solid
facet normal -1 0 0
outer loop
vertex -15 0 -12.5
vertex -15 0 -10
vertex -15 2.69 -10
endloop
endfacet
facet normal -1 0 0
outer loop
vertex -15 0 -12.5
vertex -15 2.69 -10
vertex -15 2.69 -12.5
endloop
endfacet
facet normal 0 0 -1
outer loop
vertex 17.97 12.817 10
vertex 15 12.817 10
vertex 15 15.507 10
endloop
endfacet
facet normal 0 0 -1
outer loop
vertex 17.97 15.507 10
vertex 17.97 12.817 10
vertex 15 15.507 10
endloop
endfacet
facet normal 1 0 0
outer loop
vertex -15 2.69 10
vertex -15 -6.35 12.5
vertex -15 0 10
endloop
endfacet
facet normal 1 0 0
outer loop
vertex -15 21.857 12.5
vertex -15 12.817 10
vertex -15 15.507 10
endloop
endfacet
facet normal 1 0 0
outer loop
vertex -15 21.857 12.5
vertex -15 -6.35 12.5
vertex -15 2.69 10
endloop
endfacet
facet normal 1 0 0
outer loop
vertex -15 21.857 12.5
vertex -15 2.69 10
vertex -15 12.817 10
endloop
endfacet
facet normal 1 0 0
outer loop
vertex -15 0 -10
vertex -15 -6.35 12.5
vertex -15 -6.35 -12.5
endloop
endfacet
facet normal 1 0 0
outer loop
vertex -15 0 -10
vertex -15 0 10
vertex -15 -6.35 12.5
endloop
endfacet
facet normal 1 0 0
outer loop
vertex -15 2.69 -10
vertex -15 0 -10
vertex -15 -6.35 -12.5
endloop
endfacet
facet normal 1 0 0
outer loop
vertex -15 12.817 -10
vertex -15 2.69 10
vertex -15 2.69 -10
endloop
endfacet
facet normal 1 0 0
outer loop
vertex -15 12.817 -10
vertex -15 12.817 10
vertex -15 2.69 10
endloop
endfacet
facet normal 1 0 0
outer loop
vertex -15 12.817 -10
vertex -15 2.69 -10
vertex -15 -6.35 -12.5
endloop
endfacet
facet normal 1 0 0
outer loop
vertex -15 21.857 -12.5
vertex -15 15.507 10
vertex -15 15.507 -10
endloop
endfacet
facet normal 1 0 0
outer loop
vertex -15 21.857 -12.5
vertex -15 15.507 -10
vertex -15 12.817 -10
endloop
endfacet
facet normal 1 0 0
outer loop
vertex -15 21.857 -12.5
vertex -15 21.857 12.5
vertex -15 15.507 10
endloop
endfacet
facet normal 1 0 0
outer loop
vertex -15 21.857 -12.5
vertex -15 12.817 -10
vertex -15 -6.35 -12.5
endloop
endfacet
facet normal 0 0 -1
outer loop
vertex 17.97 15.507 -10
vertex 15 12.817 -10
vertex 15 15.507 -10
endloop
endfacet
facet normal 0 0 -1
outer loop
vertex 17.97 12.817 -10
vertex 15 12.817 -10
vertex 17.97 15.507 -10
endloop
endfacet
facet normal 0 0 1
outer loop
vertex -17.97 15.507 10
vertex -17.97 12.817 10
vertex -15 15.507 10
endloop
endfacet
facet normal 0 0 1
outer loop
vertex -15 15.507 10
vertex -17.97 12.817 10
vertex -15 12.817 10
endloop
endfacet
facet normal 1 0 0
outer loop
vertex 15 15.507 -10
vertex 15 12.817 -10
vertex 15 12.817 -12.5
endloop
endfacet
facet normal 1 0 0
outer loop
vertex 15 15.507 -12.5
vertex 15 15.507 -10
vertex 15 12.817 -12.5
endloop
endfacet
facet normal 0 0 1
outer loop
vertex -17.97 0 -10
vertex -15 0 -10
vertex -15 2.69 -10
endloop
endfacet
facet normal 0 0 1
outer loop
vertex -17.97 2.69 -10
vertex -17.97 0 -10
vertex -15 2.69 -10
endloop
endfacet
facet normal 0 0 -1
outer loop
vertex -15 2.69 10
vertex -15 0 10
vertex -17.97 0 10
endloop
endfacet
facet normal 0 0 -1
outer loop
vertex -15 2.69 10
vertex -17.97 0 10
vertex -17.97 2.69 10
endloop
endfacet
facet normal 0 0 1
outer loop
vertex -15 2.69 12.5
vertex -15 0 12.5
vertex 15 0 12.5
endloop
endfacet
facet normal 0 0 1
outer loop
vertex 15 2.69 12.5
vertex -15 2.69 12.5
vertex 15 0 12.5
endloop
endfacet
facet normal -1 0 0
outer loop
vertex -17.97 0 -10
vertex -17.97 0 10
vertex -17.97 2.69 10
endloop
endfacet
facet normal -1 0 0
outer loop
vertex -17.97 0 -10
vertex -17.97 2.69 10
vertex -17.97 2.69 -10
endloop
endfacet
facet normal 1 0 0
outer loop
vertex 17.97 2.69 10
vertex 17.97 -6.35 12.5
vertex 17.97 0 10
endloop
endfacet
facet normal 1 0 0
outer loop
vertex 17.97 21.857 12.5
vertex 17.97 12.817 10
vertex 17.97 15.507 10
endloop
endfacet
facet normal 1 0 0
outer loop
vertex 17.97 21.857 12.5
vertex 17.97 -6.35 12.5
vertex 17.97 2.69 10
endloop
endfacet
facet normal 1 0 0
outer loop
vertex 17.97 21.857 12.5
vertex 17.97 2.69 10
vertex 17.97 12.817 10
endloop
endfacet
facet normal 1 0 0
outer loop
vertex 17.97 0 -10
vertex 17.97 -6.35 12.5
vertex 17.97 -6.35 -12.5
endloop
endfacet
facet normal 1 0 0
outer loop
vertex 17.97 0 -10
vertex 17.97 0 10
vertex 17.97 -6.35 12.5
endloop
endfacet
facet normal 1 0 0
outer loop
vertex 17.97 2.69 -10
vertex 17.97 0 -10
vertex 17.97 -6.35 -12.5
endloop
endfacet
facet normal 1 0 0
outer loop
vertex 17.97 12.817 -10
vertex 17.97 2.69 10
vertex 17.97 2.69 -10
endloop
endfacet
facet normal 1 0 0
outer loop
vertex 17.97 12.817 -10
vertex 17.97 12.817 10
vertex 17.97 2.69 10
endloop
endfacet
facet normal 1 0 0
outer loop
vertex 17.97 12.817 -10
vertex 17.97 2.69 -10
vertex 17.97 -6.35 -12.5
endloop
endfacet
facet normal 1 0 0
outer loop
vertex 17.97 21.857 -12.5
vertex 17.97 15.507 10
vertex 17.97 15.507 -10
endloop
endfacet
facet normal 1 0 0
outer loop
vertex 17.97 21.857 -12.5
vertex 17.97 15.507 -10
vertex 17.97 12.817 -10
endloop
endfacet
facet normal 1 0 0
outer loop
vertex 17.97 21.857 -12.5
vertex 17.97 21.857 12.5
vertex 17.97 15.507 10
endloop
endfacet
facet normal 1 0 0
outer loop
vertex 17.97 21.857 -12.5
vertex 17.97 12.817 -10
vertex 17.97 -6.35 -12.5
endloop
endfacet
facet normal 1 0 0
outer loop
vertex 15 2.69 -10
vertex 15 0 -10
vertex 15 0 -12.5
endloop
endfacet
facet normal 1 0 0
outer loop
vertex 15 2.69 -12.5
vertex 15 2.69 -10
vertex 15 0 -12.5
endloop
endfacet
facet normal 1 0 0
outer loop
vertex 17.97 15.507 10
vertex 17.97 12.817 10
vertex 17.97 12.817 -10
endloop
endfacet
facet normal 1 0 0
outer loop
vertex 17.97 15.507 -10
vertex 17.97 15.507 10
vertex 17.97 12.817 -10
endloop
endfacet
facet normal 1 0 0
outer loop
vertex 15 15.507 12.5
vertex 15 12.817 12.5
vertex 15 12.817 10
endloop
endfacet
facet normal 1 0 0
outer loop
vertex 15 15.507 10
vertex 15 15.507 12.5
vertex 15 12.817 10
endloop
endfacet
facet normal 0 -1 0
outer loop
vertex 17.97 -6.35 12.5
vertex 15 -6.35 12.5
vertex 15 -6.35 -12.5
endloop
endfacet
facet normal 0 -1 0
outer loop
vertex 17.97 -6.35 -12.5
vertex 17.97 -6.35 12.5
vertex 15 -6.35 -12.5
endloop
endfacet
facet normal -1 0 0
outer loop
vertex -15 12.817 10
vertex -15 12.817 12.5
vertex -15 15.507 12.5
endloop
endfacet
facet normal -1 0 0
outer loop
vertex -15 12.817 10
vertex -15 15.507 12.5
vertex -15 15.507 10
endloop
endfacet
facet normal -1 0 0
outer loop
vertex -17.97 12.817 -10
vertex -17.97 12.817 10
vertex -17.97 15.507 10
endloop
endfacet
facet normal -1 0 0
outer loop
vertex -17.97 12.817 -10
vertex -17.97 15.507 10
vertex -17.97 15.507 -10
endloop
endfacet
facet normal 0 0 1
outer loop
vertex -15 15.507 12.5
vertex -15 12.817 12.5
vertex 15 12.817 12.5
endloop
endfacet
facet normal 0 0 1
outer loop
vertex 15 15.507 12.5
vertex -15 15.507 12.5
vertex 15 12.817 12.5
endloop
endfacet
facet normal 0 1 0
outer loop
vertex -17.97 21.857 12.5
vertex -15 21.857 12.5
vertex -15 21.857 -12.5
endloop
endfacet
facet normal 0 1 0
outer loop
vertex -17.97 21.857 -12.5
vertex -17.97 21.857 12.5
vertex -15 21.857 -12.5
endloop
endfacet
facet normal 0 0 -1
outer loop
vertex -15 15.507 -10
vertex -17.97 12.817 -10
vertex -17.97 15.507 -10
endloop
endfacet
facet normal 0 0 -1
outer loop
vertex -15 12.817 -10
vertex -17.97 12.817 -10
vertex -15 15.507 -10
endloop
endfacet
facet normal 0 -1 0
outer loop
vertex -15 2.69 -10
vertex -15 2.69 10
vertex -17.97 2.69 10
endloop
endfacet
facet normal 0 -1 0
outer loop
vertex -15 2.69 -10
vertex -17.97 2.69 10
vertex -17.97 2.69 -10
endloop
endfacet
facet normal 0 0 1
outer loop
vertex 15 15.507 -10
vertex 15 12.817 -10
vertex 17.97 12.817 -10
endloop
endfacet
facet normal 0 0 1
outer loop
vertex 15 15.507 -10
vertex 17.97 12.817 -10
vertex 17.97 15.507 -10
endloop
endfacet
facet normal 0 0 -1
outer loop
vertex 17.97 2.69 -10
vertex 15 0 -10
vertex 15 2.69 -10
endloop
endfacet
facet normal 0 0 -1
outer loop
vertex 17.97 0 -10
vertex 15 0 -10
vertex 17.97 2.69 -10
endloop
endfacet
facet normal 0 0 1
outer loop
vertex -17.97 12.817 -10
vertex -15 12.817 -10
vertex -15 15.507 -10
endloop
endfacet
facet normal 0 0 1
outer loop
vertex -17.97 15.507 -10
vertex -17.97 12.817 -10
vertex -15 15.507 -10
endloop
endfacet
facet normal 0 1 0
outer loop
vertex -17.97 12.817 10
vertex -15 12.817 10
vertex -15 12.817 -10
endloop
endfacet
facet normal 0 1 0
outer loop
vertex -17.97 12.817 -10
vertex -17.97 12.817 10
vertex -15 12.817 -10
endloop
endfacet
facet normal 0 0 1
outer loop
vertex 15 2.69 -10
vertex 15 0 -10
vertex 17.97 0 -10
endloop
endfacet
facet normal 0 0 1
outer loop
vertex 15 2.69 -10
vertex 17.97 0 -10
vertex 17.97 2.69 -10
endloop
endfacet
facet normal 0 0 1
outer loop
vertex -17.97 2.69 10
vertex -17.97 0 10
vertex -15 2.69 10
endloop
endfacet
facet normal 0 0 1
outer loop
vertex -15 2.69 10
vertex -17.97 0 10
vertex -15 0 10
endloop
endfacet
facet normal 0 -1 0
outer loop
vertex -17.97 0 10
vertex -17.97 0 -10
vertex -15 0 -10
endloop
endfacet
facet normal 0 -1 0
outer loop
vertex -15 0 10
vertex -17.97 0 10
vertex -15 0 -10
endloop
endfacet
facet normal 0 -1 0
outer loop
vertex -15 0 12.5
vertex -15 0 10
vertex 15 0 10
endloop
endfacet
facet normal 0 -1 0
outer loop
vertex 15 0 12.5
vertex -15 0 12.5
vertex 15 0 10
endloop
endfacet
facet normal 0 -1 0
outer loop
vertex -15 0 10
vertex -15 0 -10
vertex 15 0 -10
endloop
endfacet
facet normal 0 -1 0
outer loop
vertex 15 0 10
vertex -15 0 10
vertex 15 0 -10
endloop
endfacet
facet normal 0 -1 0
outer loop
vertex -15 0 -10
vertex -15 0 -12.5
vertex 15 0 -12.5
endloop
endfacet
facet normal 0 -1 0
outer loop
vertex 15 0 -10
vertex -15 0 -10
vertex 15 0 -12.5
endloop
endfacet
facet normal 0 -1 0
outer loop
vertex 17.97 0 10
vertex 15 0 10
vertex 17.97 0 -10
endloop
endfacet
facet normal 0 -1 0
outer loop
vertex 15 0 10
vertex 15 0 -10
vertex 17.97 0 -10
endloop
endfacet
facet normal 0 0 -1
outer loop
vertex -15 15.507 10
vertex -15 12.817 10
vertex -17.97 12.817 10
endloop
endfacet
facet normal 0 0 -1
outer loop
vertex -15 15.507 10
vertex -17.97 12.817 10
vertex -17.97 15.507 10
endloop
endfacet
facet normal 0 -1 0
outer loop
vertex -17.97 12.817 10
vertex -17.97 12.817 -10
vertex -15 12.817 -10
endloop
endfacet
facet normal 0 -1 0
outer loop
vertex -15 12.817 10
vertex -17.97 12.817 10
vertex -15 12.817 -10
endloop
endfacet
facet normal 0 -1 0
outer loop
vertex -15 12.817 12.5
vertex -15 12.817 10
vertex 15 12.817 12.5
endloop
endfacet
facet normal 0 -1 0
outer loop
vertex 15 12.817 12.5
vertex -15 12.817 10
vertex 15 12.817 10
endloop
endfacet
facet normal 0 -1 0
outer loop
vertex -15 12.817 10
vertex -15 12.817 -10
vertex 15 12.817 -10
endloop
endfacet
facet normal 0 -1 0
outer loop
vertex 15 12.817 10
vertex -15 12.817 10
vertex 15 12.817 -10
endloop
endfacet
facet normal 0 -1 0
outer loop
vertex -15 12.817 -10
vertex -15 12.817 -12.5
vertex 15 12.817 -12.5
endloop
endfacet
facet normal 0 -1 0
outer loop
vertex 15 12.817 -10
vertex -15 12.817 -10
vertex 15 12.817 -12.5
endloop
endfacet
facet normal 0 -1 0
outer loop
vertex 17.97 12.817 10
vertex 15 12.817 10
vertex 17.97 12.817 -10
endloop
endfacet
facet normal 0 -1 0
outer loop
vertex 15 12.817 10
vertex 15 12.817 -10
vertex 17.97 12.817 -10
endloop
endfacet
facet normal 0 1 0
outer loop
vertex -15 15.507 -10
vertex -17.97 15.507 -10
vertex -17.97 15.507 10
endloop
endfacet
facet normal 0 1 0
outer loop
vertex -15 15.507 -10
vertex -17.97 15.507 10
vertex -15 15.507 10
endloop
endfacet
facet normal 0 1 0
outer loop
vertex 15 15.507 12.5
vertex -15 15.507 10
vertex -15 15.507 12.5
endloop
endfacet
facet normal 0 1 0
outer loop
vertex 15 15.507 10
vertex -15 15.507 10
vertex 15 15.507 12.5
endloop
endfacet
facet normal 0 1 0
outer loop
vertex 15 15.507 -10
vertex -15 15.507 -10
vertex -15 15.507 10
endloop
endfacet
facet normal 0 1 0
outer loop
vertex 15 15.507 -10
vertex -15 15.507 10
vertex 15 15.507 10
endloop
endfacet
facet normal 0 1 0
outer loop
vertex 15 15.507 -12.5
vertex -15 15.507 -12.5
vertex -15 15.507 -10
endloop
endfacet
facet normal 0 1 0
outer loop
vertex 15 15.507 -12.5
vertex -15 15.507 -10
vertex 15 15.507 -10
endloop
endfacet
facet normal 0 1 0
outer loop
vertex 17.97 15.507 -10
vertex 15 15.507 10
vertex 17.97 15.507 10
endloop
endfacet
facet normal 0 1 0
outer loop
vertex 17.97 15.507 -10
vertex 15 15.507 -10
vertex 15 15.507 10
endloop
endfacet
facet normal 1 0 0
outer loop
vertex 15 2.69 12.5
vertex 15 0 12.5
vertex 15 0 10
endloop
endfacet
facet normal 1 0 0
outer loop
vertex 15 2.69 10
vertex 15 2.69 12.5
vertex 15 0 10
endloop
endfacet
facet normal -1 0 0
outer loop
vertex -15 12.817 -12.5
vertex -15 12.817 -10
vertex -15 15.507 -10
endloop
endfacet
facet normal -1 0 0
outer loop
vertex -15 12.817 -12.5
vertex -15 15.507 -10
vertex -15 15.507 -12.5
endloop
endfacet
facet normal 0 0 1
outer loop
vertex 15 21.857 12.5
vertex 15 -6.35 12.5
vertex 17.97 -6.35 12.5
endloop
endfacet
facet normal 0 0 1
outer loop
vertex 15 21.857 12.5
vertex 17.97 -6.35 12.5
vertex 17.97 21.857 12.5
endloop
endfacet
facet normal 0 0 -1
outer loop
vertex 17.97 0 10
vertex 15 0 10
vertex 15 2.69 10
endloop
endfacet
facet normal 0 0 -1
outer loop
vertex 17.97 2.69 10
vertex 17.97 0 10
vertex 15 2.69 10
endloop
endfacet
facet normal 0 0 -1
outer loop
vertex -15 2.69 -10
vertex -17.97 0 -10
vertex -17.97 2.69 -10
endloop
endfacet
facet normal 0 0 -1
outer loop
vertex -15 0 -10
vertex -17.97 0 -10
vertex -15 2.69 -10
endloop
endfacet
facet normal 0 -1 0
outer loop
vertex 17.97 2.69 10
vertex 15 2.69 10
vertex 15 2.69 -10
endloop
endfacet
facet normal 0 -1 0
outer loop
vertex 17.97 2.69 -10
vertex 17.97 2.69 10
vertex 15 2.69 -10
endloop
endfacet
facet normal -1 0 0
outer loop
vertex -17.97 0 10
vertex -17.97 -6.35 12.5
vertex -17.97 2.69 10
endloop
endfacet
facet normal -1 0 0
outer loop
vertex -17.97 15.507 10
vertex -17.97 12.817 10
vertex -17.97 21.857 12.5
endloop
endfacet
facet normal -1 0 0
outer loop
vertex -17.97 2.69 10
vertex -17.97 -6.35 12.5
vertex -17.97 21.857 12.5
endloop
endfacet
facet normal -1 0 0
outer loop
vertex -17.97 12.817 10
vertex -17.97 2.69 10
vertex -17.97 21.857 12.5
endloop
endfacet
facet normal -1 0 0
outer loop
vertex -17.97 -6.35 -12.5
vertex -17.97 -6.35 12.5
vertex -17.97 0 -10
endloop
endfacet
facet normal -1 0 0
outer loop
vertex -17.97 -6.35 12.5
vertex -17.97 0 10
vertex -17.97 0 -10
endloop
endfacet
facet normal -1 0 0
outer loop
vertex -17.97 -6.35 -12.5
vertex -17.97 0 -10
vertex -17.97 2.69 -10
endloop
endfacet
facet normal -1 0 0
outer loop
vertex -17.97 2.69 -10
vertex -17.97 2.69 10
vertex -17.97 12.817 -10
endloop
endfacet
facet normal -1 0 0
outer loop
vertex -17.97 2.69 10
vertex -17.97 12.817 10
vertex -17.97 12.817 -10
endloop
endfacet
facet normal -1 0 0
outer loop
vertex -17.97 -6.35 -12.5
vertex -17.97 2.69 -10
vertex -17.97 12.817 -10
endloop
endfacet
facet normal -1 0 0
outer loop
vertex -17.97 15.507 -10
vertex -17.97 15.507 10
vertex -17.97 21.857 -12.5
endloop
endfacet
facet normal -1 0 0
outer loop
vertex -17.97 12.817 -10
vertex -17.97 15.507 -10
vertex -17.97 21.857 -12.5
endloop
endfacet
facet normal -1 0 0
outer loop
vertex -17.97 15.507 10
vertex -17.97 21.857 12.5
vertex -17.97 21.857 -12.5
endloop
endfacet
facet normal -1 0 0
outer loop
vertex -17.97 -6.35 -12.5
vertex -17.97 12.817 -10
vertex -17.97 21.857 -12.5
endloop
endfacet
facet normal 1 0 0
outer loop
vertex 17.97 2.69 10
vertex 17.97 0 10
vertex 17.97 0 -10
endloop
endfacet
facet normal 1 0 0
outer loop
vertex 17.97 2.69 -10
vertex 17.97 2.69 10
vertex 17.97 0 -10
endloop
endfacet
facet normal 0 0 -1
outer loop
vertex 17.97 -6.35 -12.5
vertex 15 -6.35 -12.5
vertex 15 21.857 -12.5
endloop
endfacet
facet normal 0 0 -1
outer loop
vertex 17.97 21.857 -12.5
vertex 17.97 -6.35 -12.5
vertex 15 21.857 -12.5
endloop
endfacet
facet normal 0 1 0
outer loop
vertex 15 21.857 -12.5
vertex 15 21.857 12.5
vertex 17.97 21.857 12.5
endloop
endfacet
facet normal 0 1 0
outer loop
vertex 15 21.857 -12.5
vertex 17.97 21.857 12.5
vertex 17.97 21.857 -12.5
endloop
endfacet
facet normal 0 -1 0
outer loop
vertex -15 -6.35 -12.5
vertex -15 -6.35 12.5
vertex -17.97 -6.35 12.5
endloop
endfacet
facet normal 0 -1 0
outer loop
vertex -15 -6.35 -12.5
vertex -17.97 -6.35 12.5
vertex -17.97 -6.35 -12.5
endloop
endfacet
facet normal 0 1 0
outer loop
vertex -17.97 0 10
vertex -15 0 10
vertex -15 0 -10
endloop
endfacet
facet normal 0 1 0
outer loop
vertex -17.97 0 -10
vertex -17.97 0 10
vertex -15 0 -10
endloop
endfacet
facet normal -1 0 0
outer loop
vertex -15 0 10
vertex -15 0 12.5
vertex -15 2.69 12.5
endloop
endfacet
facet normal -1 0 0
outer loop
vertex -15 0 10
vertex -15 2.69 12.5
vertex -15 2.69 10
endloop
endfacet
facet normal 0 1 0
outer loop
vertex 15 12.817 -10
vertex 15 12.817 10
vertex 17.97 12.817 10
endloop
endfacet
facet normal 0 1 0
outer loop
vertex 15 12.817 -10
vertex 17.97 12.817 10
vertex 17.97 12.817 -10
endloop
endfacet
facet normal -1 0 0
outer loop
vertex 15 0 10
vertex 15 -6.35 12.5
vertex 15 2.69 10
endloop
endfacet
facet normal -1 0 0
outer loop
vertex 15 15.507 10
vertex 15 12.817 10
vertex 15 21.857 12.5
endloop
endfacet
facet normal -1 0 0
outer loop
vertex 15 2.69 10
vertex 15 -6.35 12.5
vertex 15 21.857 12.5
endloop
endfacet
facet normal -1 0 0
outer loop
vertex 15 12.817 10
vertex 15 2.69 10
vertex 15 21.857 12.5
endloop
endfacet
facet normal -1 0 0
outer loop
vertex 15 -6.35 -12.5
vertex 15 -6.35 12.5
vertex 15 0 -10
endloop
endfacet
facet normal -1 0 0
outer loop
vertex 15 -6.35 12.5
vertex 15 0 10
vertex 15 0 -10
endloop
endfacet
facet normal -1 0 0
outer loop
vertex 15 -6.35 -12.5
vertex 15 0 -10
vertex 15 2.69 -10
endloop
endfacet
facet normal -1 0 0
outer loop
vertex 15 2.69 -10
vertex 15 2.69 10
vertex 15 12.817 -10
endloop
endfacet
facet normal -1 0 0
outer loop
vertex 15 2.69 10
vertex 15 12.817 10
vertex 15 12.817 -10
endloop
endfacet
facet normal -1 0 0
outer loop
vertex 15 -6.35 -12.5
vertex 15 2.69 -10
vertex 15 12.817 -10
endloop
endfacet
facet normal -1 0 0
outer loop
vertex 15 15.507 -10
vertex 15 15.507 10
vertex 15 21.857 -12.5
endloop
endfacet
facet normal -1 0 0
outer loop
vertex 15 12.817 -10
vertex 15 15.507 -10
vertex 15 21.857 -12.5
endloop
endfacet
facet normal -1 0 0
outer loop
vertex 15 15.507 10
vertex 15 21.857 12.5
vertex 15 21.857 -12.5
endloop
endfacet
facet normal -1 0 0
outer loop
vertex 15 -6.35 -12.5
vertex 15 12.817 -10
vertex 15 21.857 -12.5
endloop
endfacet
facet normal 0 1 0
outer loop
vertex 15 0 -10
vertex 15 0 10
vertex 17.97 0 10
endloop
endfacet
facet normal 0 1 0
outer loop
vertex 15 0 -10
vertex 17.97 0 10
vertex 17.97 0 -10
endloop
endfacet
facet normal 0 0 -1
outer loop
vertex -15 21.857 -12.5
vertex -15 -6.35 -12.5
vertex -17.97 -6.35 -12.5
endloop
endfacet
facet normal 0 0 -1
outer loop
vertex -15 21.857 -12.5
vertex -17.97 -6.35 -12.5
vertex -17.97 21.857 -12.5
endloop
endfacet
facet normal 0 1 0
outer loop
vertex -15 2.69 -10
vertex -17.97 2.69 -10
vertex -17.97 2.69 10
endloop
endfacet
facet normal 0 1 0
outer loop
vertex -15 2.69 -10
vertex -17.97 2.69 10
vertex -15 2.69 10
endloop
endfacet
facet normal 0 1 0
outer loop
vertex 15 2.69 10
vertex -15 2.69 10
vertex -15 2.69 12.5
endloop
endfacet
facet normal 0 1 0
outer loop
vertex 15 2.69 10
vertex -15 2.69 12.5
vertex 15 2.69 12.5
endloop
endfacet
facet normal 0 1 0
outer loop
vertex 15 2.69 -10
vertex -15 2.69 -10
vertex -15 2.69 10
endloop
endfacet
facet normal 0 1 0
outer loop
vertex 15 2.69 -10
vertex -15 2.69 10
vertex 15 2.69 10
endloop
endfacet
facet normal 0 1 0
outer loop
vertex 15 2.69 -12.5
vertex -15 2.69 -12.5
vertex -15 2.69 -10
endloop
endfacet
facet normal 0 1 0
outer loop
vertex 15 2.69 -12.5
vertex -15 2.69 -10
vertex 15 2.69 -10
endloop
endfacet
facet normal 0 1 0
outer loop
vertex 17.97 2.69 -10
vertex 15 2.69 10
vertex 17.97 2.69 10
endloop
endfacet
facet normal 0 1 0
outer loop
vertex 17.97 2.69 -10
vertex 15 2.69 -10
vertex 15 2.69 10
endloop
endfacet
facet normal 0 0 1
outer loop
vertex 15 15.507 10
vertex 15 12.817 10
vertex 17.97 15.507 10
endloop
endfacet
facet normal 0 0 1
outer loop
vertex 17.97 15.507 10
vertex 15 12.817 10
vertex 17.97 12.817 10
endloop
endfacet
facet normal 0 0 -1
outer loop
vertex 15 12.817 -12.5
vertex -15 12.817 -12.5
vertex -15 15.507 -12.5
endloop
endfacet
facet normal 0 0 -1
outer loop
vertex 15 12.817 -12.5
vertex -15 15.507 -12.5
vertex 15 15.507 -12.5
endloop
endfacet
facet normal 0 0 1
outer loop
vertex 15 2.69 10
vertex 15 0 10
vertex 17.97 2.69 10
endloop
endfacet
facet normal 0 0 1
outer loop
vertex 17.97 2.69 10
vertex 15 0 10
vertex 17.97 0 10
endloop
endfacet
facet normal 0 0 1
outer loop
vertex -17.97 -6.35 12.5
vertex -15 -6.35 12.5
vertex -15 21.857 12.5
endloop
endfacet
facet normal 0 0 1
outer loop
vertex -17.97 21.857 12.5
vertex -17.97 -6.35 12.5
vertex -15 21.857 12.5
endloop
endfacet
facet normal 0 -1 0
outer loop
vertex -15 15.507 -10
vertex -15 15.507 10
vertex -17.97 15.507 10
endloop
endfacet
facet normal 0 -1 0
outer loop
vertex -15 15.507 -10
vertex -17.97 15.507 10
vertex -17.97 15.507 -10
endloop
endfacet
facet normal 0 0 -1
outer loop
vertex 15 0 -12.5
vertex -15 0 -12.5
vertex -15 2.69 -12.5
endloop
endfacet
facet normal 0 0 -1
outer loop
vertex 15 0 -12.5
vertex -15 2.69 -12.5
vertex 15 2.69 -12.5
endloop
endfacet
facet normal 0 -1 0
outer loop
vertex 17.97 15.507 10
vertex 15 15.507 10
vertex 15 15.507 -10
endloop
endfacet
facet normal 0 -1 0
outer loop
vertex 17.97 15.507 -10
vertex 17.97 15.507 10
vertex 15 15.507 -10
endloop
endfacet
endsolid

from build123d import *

# Parameters (mm, degrees)
SKETCH2_W           = 30
SKETCH2_H           = 25
SKETCH2_W_2         = 2.97
SKETCH2_H_2         = 20
BOSS_EXTRUDE3_DEPTH = 2.69
BOSS_EXTRUDE4_START = 12.81745
SKETCH2_3_W         = 2.97
SKETCH2_3_H         = 20
SKETCH2_3_W_2       = 30
SKETCH2_3_H_2       = 25
BOSS_EXTRUDE4_DEPTH = 2.69
SKETCH4_W           = 25
SKETCH4_H           = 28.20745
SKETCH4_W_2         = 20
SKETCH4_H_2         = 2.69
BOSS_EXTRUDE5_DEPTH = 2.97


with BuildPart() as part:
    # Sketch2 → Boss-Extrude3 (new body)
    with BuildSketch(Plane(origin=(0, 0, 0), x_dir=(1, 0, 0), z_dir=(0, 1, 0))):
        Rectangle(SKETCH2_W, SKETCH2_H)
        with Locations((-16.485, 0)):
            Rectangle(SKETCH2_W_2, SKETCH2_H_2)
        with Locations((16.485, 0)):
            Rectangle(SKETCH2_W_2, SKETCH2_H_2)
    extrude(amount=BOSS_EXTRUDE3_DEPTH)


with BuildPart() as body_2:
    # Sketch2<3> → Boss-Extrude4 (new body)
    with BuildSketch(Plane(origin=(0, 0, 0), x_dir=(1, 0, 0), z_dir=(0, 1, 0)).offset(BOSS_EXTRUDE4_START)):
        with Locations((-16.485, 0)):
            Rectangle(SKETCH2_3_W, SKETCH2_3_H)
        Rectangle(SKETCH2_3_W_2, SKETCH2_3_H_2)
        with Locations((16.485, 0)):
            Rectangle(SKETCH2_3_W, SKETCH2_3_H)
    extrude(amount=BOSS_EXTRUDE4_DEPTH)


with BuildPart() as body_3:
    # Sketch4 → Boss-Extrude5 (new body)
    with BuildSketch(Plane(origin=(15, 0, 0), x_dir=(0, 0, -1), z_dir=(1, 0, 0))):
        with Locations((0, 7.753725)):
            Rectangle(SKETCH4_W, SKETCH4_H)
        with Locations((0, 14.16245)):
            Rectangle(SKETCH4_W_2, SKETCH4_H_2, mode=Mode.SUBTRACT)
        with Locations((0, 1.345)):
            Rectangle(SKETCH4_W_2, SKETCH4_H_2, mode=Mode.SUBTRACT)
    extrude(amount=BOSS_EXTRUDE5_DEPTH)


with BuildPart() as body_4:
    # Mirror1: mirrored copy
    add(body_3.part.mirror(Plane(origin=(0, 0, 0), x_dir=(0, 0, 1), z_dir=(1, 0, 0))))


solid = Compound([part.part, body_2.part, body_3.part, body_4.part])
